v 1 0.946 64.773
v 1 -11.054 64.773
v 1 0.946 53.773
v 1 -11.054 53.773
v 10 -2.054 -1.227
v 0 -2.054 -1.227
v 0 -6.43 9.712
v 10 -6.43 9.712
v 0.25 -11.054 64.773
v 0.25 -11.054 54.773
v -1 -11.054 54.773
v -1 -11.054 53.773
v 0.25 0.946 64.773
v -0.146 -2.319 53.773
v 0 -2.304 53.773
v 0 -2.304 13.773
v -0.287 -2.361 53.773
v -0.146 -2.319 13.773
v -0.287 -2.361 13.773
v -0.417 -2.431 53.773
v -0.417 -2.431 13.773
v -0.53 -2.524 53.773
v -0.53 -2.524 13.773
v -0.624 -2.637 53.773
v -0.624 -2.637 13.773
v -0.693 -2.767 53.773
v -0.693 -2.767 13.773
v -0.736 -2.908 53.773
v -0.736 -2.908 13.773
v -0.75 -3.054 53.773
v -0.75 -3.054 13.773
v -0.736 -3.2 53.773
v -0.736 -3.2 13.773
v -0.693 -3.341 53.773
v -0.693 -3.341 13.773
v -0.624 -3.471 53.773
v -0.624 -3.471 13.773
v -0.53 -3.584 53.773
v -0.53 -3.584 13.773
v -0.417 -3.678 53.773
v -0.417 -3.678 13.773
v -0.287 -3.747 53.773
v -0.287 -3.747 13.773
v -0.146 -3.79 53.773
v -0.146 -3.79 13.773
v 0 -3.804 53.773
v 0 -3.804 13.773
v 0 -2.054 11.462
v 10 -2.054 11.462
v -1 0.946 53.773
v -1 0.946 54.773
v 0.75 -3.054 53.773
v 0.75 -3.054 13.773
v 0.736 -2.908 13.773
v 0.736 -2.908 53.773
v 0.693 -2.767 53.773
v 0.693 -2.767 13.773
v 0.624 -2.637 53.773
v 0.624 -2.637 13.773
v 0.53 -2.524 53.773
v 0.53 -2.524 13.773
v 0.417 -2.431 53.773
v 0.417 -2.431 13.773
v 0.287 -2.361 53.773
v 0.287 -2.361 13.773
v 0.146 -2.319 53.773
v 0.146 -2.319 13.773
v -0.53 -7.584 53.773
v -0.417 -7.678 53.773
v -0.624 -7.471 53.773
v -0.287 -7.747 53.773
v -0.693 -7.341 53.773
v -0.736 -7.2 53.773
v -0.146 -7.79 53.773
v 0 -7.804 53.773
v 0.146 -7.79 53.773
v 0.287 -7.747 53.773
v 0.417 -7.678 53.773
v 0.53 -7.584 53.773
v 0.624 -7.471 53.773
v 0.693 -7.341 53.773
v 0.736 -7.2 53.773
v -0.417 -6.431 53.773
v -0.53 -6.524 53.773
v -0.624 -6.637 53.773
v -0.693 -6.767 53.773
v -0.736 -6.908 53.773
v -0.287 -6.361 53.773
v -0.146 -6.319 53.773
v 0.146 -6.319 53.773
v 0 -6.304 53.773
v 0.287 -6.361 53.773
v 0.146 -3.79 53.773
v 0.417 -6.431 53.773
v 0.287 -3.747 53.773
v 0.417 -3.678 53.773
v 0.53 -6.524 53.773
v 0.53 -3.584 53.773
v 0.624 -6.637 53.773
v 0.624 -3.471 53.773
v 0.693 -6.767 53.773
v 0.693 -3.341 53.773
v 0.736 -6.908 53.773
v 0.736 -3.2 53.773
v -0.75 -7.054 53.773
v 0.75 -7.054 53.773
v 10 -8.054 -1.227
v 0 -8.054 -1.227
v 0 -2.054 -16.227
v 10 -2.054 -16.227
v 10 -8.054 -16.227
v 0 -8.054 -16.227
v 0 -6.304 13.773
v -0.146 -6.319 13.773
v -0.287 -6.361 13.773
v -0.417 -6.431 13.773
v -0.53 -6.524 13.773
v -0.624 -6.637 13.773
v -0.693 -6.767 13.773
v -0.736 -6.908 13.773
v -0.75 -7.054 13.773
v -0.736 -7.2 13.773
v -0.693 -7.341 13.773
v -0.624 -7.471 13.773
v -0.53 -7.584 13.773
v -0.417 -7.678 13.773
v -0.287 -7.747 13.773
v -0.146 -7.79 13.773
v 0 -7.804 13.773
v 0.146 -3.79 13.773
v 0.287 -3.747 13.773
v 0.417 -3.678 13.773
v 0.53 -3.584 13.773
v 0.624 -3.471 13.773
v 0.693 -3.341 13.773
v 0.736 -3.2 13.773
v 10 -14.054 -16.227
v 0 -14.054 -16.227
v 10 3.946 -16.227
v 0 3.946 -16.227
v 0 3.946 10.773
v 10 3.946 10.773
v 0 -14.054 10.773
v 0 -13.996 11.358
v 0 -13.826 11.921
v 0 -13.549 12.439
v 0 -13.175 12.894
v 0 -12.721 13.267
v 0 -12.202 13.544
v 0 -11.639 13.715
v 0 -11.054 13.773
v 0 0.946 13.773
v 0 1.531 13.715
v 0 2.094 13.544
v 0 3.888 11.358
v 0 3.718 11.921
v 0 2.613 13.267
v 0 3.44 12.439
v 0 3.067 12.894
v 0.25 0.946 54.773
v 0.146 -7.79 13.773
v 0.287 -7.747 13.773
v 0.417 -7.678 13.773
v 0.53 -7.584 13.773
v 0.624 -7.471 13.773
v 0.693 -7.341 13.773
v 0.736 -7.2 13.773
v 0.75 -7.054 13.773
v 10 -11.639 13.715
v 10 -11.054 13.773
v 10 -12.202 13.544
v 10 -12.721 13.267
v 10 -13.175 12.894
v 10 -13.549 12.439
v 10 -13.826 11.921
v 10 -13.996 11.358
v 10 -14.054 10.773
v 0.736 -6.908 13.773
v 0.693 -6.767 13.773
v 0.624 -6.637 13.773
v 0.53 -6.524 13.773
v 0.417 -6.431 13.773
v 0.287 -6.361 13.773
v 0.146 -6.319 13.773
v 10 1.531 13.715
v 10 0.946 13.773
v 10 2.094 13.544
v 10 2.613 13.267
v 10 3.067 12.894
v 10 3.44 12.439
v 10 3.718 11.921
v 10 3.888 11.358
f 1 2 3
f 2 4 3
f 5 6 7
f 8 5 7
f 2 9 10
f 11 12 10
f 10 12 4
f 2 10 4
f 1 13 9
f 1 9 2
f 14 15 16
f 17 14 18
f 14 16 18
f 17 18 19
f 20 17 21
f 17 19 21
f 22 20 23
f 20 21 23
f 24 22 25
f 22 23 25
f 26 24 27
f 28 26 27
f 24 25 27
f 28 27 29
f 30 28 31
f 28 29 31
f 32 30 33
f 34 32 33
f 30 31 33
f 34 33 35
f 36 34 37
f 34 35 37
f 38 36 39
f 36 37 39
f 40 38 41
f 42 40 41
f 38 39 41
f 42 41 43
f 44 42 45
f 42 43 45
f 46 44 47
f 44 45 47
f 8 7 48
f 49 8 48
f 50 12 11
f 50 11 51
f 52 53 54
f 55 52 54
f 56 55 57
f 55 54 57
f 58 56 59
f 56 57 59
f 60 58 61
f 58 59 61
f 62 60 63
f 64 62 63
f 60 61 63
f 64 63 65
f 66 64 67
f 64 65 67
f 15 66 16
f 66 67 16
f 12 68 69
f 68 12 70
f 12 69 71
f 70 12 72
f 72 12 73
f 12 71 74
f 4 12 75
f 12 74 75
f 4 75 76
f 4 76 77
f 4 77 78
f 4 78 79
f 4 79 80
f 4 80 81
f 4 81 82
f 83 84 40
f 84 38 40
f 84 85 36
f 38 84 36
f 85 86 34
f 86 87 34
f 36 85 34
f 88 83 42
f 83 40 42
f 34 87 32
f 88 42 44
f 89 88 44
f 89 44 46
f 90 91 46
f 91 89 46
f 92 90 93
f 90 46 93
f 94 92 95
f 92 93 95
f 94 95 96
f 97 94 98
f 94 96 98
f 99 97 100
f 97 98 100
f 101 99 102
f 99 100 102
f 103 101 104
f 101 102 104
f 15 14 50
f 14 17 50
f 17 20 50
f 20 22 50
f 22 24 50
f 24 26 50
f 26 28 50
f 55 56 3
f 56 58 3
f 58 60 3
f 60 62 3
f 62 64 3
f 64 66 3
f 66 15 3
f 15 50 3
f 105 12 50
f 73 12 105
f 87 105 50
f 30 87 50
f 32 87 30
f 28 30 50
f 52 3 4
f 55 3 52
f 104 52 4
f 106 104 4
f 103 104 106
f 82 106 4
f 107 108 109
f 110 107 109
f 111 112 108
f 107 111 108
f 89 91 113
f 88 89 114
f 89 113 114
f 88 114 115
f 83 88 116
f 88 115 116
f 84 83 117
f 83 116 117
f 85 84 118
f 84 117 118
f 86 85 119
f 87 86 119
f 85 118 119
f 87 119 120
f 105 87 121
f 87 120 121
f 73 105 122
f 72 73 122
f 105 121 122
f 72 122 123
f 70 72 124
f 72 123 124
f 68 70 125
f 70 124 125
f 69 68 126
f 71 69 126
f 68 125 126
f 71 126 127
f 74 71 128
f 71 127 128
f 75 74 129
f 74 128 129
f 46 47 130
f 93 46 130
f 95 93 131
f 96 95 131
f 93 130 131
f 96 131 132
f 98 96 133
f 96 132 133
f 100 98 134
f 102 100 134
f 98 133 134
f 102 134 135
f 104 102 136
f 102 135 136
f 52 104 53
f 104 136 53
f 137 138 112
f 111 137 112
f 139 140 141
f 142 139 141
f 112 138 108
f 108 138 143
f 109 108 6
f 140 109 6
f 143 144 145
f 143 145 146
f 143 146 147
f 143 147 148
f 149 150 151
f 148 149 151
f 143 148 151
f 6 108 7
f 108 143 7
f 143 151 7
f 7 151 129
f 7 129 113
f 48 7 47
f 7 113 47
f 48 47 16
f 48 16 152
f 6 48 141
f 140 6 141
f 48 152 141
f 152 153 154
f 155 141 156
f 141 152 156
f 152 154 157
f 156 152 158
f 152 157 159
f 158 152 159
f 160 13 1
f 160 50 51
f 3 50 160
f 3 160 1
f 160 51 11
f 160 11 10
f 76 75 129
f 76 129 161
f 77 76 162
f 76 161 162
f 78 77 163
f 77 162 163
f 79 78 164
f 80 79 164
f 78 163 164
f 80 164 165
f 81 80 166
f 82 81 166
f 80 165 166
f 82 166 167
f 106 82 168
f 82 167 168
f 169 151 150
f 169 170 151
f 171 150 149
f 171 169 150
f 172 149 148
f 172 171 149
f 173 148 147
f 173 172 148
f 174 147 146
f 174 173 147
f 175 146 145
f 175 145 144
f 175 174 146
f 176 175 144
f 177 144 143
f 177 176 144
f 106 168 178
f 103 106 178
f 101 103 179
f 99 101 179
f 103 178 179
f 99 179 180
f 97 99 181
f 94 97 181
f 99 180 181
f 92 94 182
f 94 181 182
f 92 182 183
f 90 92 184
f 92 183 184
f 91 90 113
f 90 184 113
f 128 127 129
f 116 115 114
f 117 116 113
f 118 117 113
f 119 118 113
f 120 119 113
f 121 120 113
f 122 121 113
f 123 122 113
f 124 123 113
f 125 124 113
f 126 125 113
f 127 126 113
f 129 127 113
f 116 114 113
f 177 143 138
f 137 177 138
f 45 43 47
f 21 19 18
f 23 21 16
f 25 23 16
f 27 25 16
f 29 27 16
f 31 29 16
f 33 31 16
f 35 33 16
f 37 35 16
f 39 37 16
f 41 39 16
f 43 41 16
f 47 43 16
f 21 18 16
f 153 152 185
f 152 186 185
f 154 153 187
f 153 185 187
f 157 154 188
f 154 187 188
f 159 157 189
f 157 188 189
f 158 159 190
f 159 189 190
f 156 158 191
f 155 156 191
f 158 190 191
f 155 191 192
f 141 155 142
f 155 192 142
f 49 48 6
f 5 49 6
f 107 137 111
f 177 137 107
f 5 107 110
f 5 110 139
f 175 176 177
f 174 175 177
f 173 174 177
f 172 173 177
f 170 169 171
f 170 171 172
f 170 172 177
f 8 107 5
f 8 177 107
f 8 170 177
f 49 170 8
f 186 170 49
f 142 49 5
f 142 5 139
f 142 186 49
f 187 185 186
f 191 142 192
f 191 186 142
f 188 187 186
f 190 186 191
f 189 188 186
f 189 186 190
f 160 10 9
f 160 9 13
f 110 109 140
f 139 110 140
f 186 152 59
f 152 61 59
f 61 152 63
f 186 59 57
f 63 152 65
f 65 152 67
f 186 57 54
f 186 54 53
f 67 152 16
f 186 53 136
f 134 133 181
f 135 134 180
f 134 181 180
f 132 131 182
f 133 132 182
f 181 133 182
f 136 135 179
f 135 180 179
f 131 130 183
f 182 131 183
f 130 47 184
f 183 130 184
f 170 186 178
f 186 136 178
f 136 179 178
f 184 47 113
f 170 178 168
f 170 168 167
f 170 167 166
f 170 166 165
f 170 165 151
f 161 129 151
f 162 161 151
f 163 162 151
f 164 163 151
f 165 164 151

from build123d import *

# Parameters (mm, degrees)
F1_DEPTH = 10
F2_R     = 3
F3_R     = 3
F5_DEPTH = 40
F6_W     = 2
F6_H     = 12
F7_DEPTH = 1
F8_W     = 0.75
F8_H     = 12
F9_DEPTH = 10


with BuildPart() as f1:
    # F0 (on Right) → F1 (new body)
    with BuildSketch(Plane.YZ):
        Polygon((-2.054113, 13.772698), (-8.054113, 13.772698), (-6.429656, 9.711557), (-2.054113, 11.461774), align=None)
        Polygon((3.945887, 13.772698), (-2.054113, 13.772698), (-2.054113, 11.461774), (-2.054113, -1.227302), (3.945887, -16.227302), (3.945887, 12.582935), align=None)
        Polygon((-2.054113, -1.227302), (-2.054113, -16.227302), (3.945887, -16.227302), align=None)
        Polygon((-6.429656, 9.711557), (-8.054113, 13.772698), (-8.054113, -1.227302), (-2.054113, -16.227302), (-2.054113, -1.227302), align=None)
        Polygon((-8.054113, 13.772698), (-14.054113, 13.772698), (-8.054113, -1.227302), align=None)
        Polygon((-8.054113, -1.227302), (-14.054113, 13.772698), (-14.054113, -16.227302), (-8.054113, -16.227302), align=None)
    extrude(amount=F1_DEPTH)

    # F2
    f2_edges = [f1.edges().sort_by_distance(p)[0] for p in [
        (5, -14.054113, 13.772698),
    ]]
    fillet(f2_edges, radius=F2_R)

    # F3
    f3_edges = [f1.edges().sort_by_distance(p)[0] for p in [
        (5, 3.945887, 13.772698),
    ]]
    fillet(f3_edges, radius=F3_R)

    # F4 (on face) → F5 (join)
    with BuildSketch(Plane.XY.offset(13.772698)):
        with BuildLine():
            ThreePointArc((0, -3.804113), (0.53033, -3.584443), (0.75, -3.054113))
            ThreePointArc((0.75, -3.054113), (0.53033, -2.523782), (0, -2.304113))
            Line((0, -2.304113), (0, -3.804113))
        make_face()
        with BuildLine():
            Line((0, -3.804113), (0, -2.304113))
            ThreePointArc((0, -2.304113), (-0.75, -3.054113), (0, -3.804113))
        make_face()
        with BuildLine():
            ThreePointArc((0.75, -7.054113), (0.53033, -6.523782), (0, -6.304113))
            Line((0, -6.304113), (0, -7.804113))
            ThreePointArc((0, -7.804113), (0.53033, -7.584443), (0.75, -7.054113))
        make_face()
        with BuildLine():
            Line((0, -7.804113), (0, -6.304113))
            ThreePointArc((0, -6.304113), (-0.75, -7.054113), (0, -7.804113))
        make_face()
    extrude(amount=F5_DEPTH)

    # F6 (on face) → F7 (join)
    with BuildSketch(Plane.XY.offset(53.772698)):
        with Locations((0, -5.054113)):
            Rectangle(F6_W, F6_H)
    extrude(amount=F7_DEPTH)

    # F8 (on face) → F9 (join)
    with BuildSketch(Plane.XY.offset(54.772698)):
        with Locations((0.625, -5.054113)):
            Rectangle(F8_W, F8_H)
    extrude(amount=F9_DEPTH)


solid = f1.part
